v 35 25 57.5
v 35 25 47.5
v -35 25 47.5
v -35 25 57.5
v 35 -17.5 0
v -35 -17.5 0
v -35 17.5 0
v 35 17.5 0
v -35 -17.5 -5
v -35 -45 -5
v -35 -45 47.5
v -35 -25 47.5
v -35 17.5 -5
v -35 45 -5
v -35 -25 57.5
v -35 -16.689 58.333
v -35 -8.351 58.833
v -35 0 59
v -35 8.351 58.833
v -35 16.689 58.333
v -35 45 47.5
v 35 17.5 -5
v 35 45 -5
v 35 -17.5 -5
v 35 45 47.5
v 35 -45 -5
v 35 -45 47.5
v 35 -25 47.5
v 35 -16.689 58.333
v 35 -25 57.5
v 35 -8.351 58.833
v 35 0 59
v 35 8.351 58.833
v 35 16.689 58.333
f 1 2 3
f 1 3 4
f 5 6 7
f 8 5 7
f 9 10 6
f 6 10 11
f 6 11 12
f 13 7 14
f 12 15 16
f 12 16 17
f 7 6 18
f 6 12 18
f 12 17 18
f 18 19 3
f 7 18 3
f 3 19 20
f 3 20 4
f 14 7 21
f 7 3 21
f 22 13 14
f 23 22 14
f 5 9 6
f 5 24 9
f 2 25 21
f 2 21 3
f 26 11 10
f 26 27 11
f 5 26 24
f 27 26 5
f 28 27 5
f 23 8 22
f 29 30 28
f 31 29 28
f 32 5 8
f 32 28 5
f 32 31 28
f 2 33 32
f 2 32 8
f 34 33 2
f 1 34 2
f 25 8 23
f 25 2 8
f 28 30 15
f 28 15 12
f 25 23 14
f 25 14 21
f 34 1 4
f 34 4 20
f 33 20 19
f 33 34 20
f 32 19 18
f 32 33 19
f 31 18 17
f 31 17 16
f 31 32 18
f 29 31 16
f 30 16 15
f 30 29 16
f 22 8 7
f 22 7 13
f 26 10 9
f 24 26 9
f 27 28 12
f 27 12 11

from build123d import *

# Parameters (mm, degrees)
F1_DEPTH = 35


with BuildPart() as f1:
    # F0 (on Right) → F1 (new body, symmetric)
    with BuildSketch(Plane.YZ):
        with BuildLine():
            Line((-17.5, -5), (-17.5, 0))
            Line((-17.5, 0), (0, 0))
            Line((0, 0), (17.5, 0))
            Line((17.5, 0), (17.5, -5))
            Line((17.5, -5), (45, -5))
            Line((45, -5), (45, 47.5))
            Line((45, 47.5), (25, 47.5))
            Line((25, 47.5), (25, 57.5))
            ThreePointArc((25, 57.5), (12.5224797864, 58.6246631061), (0, 59))
            ThreePointArc((0, 59), (-12.5224797864, 58.6246631061), (-25, 57.5))
            Line((-25, 57.5), (-25, 47.5))
            Line((-25, 47.5), (-45, 47.5))
            Line((-45, 47.5), (-45, -5))
            Line((-45, -5), (-17.5, -5))
        make_face()
    extrude(amount=F1_DEPTH, both=True)


solid = f1.part
